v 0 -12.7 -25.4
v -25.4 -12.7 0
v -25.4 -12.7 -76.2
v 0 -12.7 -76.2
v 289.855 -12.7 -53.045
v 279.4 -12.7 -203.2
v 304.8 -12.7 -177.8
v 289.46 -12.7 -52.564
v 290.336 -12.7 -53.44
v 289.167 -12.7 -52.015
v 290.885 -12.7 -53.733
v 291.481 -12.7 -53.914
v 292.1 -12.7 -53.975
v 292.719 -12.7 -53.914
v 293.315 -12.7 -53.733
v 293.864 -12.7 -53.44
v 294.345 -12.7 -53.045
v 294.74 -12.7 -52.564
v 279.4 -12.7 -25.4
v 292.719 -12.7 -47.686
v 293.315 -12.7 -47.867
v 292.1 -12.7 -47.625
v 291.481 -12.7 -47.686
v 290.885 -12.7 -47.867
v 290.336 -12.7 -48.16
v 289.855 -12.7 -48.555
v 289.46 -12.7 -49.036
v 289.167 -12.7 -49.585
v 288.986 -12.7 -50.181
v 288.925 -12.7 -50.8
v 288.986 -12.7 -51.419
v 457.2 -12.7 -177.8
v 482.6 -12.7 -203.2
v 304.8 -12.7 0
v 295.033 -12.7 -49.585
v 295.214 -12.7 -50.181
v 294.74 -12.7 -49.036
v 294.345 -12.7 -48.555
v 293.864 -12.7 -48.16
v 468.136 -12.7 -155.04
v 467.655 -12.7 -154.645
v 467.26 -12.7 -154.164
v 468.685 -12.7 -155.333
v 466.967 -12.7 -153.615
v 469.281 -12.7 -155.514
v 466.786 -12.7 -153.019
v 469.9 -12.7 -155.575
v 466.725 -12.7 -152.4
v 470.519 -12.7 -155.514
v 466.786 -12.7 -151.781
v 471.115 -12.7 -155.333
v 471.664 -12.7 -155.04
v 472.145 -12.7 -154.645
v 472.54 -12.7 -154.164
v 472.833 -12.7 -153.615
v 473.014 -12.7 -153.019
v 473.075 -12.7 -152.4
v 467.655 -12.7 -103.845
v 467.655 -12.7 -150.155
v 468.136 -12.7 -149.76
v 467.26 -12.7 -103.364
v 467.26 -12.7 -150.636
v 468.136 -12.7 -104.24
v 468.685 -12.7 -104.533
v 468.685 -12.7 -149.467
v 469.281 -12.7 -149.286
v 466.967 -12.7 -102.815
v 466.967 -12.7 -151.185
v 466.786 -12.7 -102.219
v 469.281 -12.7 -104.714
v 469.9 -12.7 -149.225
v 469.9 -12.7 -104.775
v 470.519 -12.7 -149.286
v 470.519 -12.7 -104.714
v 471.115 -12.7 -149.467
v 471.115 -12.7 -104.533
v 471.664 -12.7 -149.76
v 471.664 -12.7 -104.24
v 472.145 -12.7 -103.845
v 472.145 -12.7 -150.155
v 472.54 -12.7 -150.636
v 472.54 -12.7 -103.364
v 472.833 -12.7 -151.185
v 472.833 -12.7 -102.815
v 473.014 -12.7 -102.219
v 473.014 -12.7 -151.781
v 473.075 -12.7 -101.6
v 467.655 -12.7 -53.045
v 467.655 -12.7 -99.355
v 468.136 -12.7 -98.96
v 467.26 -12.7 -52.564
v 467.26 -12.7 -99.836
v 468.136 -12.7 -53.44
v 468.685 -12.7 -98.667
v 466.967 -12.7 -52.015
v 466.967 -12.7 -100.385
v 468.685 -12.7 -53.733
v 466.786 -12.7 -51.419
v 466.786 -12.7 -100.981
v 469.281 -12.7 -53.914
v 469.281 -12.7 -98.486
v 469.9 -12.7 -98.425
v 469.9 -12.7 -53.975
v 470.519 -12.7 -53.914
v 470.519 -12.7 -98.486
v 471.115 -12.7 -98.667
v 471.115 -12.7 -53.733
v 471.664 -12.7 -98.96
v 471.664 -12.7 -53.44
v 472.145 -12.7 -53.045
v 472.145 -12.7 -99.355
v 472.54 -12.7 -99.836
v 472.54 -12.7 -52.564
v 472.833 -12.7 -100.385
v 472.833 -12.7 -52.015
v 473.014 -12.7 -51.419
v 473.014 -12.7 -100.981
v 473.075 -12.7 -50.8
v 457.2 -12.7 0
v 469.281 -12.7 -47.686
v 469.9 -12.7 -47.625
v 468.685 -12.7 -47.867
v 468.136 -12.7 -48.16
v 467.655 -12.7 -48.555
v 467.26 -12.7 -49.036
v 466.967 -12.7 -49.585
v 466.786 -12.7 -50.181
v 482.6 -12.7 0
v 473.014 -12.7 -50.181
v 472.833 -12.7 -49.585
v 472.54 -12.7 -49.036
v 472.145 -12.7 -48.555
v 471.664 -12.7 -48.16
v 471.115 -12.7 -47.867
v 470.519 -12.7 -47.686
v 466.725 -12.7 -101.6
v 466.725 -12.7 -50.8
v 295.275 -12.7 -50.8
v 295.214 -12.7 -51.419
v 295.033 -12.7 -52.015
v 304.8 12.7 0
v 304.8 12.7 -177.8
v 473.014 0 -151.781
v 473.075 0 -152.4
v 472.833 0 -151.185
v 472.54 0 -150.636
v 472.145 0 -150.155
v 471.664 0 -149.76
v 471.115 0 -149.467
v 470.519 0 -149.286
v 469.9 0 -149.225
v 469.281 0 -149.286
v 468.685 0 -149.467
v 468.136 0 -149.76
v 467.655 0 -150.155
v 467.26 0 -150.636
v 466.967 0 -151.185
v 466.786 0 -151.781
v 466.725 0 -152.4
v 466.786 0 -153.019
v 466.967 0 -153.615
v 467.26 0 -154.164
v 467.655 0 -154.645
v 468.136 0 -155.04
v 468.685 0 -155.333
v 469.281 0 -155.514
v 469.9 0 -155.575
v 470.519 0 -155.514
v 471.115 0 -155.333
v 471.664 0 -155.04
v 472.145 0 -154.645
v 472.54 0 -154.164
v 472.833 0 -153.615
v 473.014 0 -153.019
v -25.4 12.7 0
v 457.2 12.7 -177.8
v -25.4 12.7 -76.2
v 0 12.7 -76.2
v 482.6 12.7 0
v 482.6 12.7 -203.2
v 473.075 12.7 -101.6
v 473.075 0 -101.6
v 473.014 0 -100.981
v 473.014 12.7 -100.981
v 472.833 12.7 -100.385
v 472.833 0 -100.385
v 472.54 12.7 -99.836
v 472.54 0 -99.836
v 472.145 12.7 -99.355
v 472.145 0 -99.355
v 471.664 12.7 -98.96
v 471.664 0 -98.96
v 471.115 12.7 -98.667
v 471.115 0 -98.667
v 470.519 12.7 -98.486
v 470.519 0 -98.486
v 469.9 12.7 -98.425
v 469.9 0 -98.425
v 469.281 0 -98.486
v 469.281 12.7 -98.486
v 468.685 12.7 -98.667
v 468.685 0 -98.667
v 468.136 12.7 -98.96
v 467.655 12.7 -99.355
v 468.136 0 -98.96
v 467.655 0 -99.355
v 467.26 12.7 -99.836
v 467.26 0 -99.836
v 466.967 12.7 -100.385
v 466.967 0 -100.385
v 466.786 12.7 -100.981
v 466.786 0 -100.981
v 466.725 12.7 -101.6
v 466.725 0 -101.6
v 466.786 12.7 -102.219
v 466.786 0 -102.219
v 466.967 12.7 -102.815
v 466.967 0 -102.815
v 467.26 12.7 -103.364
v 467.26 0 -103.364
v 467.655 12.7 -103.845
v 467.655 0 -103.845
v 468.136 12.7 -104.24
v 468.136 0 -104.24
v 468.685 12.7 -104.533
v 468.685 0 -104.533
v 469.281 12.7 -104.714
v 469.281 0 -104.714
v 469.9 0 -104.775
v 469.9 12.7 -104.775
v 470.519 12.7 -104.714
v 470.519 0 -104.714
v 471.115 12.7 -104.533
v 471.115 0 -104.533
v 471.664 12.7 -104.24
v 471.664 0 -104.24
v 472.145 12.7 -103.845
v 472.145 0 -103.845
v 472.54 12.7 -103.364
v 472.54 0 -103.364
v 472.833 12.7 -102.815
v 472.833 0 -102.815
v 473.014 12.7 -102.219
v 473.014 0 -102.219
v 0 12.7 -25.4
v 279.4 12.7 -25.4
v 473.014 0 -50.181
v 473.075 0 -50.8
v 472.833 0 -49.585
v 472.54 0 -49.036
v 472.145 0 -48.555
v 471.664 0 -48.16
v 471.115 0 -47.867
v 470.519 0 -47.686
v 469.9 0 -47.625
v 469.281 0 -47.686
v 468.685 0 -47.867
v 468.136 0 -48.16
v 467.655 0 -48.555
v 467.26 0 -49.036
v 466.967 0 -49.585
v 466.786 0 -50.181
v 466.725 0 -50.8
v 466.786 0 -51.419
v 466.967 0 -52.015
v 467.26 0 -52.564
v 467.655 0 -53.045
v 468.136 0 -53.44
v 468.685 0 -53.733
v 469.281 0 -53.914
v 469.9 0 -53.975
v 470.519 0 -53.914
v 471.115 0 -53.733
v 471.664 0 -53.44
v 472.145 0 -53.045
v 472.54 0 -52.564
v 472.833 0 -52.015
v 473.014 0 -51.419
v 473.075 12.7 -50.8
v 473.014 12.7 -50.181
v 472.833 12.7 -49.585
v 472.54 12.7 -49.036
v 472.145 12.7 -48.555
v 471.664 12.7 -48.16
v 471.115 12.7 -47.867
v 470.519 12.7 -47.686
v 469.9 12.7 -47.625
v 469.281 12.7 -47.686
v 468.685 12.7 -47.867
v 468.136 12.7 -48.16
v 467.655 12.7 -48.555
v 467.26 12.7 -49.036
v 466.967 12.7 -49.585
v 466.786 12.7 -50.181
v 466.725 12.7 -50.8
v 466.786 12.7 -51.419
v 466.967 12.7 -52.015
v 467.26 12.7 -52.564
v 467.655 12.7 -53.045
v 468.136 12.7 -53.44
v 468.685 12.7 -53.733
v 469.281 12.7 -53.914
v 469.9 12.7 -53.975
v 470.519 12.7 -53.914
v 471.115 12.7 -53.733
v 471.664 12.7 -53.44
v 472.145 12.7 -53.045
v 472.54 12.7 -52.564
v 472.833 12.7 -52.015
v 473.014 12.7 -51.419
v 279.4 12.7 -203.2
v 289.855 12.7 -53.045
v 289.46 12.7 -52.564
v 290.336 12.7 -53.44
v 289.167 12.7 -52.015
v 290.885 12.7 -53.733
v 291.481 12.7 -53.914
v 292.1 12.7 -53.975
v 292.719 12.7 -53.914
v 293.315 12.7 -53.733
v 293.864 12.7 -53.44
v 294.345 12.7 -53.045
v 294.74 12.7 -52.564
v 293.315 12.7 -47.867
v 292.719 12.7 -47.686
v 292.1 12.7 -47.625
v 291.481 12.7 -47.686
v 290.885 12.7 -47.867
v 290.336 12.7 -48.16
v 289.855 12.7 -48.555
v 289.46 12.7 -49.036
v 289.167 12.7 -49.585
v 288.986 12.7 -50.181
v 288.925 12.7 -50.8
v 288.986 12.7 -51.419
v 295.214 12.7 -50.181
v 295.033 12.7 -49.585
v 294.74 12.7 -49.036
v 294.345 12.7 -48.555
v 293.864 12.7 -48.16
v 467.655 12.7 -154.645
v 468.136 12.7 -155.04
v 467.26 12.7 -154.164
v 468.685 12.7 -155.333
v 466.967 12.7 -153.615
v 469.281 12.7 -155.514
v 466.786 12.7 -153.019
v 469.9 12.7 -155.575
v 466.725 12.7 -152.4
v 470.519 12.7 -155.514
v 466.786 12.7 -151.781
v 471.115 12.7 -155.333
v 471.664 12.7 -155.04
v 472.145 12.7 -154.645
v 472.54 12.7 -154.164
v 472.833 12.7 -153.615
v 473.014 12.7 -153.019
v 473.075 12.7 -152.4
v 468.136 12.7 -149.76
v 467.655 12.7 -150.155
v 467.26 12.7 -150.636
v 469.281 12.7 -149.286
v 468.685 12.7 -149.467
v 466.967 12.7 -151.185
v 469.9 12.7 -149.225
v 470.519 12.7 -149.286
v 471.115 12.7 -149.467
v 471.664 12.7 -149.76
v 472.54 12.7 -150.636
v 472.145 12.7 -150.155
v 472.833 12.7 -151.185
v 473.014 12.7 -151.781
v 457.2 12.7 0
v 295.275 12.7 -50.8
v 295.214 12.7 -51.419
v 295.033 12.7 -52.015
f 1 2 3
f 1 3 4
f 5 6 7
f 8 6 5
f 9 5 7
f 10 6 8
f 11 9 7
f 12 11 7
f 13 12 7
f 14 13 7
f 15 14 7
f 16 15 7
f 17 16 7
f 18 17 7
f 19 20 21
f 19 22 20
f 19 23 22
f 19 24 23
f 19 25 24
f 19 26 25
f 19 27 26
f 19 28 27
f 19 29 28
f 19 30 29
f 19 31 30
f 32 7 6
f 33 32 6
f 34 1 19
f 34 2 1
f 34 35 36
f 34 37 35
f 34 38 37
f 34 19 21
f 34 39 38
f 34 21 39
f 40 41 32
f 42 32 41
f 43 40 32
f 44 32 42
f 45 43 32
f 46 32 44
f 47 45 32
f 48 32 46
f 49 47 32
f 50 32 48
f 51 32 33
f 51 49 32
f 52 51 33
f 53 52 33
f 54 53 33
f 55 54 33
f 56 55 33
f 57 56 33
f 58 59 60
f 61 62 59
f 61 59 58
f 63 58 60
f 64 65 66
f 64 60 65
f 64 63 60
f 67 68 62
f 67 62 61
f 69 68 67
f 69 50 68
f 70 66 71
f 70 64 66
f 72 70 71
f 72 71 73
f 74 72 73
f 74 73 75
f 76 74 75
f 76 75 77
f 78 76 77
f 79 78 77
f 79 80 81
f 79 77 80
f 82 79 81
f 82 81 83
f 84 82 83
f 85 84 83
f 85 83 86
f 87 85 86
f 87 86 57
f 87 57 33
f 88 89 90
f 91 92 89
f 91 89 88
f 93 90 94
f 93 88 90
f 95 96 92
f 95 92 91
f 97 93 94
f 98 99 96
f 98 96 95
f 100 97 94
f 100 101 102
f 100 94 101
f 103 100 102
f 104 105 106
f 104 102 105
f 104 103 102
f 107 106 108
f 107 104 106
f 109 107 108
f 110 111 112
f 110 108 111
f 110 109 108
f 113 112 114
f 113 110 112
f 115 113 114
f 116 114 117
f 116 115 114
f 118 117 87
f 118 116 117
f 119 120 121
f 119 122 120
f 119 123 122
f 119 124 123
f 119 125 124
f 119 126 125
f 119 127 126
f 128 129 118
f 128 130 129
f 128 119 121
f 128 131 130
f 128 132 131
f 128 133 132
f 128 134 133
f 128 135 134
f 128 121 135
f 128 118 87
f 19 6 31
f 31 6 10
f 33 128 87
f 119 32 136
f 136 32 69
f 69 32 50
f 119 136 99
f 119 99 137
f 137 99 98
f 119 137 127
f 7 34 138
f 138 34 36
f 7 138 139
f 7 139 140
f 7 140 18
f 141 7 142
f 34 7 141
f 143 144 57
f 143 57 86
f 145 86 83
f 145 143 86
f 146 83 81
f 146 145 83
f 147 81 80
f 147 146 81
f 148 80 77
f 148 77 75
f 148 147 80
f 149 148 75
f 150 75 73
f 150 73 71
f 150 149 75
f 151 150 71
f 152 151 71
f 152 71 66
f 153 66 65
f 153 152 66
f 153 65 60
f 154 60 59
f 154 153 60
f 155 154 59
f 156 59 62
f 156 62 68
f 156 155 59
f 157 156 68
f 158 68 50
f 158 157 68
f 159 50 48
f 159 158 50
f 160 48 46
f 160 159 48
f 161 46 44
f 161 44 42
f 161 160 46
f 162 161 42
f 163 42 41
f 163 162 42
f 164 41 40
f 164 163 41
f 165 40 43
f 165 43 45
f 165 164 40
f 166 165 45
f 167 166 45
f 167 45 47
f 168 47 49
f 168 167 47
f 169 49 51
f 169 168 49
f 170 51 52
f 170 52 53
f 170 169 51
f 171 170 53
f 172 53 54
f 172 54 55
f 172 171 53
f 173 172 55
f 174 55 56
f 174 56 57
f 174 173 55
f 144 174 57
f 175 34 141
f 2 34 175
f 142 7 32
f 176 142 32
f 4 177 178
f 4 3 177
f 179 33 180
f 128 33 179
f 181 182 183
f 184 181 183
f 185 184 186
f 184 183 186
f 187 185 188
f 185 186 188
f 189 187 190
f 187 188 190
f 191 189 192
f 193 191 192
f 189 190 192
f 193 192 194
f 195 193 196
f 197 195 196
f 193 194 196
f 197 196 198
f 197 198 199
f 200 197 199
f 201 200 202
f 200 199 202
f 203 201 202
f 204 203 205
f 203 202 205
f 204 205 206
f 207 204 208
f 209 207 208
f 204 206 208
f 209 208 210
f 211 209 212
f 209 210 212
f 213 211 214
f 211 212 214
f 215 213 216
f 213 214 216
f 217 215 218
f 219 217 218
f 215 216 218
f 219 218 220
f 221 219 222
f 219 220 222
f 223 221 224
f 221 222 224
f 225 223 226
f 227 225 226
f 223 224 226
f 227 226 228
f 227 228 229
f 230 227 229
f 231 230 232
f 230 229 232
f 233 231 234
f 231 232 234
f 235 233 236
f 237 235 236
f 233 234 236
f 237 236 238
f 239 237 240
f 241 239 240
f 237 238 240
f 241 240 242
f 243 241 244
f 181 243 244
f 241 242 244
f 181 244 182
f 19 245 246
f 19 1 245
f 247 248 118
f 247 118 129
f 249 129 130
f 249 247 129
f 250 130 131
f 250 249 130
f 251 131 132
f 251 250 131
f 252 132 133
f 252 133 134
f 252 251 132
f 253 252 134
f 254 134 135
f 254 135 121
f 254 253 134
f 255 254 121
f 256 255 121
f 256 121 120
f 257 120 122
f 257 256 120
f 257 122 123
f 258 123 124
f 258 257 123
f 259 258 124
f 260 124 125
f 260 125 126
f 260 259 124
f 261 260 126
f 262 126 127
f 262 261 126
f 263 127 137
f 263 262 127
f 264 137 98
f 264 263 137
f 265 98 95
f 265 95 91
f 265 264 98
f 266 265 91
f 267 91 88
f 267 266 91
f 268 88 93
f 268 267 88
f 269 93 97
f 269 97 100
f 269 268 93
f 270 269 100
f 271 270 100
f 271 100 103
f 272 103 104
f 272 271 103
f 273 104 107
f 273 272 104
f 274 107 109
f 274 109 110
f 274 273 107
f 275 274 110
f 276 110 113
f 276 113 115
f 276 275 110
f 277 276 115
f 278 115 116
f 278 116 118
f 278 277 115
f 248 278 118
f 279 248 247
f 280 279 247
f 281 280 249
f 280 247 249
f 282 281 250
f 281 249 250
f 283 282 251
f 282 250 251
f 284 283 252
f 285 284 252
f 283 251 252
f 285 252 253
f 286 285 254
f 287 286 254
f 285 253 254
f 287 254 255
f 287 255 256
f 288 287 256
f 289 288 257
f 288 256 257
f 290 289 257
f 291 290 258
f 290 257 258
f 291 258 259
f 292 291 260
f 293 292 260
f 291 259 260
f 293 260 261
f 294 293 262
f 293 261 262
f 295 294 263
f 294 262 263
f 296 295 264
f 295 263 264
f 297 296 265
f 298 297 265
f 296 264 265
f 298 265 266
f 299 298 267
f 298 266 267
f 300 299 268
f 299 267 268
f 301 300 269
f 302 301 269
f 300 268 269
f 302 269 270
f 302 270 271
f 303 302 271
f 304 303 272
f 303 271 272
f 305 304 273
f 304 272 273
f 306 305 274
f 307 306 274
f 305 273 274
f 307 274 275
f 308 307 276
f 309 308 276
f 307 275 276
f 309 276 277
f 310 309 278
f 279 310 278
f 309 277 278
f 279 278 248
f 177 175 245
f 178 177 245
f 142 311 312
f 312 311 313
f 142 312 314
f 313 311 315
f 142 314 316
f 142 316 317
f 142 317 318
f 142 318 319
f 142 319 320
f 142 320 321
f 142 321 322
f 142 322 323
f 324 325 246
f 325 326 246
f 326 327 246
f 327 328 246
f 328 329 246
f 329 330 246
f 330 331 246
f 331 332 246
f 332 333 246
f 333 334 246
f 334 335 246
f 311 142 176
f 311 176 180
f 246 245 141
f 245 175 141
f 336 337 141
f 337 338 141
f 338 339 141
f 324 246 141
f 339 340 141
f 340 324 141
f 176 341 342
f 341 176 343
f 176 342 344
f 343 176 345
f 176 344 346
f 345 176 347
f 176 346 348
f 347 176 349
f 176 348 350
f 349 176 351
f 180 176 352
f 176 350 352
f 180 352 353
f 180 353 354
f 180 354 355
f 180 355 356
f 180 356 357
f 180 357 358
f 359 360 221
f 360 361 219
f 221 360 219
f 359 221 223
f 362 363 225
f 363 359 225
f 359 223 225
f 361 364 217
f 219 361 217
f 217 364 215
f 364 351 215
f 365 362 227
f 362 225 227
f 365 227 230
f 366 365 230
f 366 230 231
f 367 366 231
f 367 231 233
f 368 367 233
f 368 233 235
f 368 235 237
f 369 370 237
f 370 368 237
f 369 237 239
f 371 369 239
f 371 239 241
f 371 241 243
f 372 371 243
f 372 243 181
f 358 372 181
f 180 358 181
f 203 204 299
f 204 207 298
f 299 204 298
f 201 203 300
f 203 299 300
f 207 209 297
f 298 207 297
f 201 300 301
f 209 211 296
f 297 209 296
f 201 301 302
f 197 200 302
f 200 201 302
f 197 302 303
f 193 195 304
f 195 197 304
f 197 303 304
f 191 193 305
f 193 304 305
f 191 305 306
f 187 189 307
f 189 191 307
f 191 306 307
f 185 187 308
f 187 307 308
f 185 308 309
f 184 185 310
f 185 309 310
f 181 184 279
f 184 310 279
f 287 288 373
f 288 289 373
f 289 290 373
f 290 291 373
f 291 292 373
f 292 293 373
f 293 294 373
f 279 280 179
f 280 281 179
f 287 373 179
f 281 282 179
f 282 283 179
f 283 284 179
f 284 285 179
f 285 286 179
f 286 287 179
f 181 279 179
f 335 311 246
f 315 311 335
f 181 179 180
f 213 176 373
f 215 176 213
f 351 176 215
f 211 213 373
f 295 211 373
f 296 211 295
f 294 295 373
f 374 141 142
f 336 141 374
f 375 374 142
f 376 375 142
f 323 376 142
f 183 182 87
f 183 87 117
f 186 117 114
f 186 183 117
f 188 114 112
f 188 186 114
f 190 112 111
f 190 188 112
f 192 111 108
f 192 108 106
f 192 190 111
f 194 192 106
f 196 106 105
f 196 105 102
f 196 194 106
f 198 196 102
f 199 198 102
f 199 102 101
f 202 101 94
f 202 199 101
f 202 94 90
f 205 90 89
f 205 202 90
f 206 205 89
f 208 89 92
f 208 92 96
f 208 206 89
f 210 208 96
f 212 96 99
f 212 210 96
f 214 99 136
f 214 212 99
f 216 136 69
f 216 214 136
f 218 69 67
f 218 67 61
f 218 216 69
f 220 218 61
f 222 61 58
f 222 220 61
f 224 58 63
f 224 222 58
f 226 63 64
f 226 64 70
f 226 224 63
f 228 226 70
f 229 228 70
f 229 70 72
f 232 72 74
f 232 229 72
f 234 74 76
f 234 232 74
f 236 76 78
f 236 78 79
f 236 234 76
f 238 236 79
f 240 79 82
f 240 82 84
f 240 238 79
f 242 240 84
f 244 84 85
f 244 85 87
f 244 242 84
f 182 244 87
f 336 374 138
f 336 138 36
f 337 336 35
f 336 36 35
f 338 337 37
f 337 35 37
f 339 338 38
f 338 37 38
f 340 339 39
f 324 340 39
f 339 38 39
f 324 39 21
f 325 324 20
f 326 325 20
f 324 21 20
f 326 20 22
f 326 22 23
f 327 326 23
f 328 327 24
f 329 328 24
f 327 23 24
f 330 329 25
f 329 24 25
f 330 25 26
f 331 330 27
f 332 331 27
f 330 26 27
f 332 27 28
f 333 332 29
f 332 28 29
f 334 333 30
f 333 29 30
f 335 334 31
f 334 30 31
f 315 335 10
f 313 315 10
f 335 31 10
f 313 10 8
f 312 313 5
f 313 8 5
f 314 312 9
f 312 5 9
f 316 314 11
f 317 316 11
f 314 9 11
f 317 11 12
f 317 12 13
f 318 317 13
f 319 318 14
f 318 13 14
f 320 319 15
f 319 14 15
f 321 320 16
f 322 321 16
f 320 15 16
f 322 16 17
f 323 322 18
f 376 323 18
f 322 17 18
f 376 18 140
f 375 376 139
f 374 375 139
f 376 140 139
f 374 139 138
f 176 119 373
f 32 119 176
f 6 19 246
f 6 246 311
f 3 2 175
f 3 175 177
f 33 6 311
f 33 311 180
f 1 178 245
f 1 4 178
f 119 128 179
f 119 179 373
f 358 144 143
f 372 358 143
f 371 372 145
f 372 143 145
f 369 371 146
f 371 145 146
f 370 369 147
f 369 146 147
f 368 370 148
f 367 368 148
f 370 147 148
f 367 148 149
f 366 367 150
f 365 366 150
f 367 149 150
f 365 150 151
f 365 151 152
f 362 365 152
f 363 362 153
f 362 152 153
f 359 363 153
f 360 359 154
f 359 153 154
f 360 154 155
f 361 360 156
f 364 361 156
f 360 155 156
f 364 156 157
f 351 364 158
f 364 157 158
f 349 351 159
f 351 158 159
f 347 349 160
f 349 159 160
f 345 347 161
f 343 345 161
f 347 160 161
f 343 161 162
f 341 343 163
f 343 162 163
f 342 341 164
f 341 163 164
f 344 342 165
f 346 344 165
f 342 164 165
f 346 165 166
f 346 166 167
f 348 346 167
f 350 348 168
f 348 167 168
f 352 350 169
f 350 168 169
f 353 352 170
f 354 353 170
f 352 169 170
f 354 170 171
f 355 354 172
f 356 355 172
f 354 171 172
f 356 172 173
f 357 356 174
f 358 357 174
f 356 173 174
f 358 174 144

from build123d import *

# Parameters (mm, degrees)
F0_W     = 279.4
F0_H     = 25.4
F0_W_2   = 152.4
F1_DEPTH = 12.7
F2_R     = 3.175
F3_DEPTH = 12.7


with BuildPart() as f1:
    # F0 (on Front) → F1 (new body, symmetric)
    with BuildSketch(Plane.XZ):
        with Locations((139.7, -12.7)):
            Rectangle(F0_W, F0_H)
        Polygon((0, -25.4), (0, 0), (-25.4, 0), (-25.4, -76.2), (0, -76.2), align=None)
        Polygon((304.8, 0), (279.4, 0), (279.4, -25.4), (279.4, -203.2), (304.8, -203.2), (304.8, -177.8), align=None)
        with Locations((381, -190.5)):
            Rectangle(F0_W_2, F0_H)
        Polygon((457.2, 0), (457.2, -177.8), (457.2, -203.2), (482.6, -203.2), (482.6, 0), align=None)
    extrude(amount=F1_DEPTH, both=True)

    # F2 (on Front) → F3 (cut, symmetric)
    with BuildSketch(Plane.XZ):
        with Locations((469.9, -101.6)):
            Circle(F2_R)
        with Locations((469.9, -50.8)):
            Circle(F2_R)
        with Locations((469.9, -152.4)):
            Circle(F2_R)
        with Locations((292.1, -50.8)):
            Circle(F2_R)
    extrude(amount=F3_DEPTH, both=True, mode=Mode.SUBTRACT)


solid = f1.part
